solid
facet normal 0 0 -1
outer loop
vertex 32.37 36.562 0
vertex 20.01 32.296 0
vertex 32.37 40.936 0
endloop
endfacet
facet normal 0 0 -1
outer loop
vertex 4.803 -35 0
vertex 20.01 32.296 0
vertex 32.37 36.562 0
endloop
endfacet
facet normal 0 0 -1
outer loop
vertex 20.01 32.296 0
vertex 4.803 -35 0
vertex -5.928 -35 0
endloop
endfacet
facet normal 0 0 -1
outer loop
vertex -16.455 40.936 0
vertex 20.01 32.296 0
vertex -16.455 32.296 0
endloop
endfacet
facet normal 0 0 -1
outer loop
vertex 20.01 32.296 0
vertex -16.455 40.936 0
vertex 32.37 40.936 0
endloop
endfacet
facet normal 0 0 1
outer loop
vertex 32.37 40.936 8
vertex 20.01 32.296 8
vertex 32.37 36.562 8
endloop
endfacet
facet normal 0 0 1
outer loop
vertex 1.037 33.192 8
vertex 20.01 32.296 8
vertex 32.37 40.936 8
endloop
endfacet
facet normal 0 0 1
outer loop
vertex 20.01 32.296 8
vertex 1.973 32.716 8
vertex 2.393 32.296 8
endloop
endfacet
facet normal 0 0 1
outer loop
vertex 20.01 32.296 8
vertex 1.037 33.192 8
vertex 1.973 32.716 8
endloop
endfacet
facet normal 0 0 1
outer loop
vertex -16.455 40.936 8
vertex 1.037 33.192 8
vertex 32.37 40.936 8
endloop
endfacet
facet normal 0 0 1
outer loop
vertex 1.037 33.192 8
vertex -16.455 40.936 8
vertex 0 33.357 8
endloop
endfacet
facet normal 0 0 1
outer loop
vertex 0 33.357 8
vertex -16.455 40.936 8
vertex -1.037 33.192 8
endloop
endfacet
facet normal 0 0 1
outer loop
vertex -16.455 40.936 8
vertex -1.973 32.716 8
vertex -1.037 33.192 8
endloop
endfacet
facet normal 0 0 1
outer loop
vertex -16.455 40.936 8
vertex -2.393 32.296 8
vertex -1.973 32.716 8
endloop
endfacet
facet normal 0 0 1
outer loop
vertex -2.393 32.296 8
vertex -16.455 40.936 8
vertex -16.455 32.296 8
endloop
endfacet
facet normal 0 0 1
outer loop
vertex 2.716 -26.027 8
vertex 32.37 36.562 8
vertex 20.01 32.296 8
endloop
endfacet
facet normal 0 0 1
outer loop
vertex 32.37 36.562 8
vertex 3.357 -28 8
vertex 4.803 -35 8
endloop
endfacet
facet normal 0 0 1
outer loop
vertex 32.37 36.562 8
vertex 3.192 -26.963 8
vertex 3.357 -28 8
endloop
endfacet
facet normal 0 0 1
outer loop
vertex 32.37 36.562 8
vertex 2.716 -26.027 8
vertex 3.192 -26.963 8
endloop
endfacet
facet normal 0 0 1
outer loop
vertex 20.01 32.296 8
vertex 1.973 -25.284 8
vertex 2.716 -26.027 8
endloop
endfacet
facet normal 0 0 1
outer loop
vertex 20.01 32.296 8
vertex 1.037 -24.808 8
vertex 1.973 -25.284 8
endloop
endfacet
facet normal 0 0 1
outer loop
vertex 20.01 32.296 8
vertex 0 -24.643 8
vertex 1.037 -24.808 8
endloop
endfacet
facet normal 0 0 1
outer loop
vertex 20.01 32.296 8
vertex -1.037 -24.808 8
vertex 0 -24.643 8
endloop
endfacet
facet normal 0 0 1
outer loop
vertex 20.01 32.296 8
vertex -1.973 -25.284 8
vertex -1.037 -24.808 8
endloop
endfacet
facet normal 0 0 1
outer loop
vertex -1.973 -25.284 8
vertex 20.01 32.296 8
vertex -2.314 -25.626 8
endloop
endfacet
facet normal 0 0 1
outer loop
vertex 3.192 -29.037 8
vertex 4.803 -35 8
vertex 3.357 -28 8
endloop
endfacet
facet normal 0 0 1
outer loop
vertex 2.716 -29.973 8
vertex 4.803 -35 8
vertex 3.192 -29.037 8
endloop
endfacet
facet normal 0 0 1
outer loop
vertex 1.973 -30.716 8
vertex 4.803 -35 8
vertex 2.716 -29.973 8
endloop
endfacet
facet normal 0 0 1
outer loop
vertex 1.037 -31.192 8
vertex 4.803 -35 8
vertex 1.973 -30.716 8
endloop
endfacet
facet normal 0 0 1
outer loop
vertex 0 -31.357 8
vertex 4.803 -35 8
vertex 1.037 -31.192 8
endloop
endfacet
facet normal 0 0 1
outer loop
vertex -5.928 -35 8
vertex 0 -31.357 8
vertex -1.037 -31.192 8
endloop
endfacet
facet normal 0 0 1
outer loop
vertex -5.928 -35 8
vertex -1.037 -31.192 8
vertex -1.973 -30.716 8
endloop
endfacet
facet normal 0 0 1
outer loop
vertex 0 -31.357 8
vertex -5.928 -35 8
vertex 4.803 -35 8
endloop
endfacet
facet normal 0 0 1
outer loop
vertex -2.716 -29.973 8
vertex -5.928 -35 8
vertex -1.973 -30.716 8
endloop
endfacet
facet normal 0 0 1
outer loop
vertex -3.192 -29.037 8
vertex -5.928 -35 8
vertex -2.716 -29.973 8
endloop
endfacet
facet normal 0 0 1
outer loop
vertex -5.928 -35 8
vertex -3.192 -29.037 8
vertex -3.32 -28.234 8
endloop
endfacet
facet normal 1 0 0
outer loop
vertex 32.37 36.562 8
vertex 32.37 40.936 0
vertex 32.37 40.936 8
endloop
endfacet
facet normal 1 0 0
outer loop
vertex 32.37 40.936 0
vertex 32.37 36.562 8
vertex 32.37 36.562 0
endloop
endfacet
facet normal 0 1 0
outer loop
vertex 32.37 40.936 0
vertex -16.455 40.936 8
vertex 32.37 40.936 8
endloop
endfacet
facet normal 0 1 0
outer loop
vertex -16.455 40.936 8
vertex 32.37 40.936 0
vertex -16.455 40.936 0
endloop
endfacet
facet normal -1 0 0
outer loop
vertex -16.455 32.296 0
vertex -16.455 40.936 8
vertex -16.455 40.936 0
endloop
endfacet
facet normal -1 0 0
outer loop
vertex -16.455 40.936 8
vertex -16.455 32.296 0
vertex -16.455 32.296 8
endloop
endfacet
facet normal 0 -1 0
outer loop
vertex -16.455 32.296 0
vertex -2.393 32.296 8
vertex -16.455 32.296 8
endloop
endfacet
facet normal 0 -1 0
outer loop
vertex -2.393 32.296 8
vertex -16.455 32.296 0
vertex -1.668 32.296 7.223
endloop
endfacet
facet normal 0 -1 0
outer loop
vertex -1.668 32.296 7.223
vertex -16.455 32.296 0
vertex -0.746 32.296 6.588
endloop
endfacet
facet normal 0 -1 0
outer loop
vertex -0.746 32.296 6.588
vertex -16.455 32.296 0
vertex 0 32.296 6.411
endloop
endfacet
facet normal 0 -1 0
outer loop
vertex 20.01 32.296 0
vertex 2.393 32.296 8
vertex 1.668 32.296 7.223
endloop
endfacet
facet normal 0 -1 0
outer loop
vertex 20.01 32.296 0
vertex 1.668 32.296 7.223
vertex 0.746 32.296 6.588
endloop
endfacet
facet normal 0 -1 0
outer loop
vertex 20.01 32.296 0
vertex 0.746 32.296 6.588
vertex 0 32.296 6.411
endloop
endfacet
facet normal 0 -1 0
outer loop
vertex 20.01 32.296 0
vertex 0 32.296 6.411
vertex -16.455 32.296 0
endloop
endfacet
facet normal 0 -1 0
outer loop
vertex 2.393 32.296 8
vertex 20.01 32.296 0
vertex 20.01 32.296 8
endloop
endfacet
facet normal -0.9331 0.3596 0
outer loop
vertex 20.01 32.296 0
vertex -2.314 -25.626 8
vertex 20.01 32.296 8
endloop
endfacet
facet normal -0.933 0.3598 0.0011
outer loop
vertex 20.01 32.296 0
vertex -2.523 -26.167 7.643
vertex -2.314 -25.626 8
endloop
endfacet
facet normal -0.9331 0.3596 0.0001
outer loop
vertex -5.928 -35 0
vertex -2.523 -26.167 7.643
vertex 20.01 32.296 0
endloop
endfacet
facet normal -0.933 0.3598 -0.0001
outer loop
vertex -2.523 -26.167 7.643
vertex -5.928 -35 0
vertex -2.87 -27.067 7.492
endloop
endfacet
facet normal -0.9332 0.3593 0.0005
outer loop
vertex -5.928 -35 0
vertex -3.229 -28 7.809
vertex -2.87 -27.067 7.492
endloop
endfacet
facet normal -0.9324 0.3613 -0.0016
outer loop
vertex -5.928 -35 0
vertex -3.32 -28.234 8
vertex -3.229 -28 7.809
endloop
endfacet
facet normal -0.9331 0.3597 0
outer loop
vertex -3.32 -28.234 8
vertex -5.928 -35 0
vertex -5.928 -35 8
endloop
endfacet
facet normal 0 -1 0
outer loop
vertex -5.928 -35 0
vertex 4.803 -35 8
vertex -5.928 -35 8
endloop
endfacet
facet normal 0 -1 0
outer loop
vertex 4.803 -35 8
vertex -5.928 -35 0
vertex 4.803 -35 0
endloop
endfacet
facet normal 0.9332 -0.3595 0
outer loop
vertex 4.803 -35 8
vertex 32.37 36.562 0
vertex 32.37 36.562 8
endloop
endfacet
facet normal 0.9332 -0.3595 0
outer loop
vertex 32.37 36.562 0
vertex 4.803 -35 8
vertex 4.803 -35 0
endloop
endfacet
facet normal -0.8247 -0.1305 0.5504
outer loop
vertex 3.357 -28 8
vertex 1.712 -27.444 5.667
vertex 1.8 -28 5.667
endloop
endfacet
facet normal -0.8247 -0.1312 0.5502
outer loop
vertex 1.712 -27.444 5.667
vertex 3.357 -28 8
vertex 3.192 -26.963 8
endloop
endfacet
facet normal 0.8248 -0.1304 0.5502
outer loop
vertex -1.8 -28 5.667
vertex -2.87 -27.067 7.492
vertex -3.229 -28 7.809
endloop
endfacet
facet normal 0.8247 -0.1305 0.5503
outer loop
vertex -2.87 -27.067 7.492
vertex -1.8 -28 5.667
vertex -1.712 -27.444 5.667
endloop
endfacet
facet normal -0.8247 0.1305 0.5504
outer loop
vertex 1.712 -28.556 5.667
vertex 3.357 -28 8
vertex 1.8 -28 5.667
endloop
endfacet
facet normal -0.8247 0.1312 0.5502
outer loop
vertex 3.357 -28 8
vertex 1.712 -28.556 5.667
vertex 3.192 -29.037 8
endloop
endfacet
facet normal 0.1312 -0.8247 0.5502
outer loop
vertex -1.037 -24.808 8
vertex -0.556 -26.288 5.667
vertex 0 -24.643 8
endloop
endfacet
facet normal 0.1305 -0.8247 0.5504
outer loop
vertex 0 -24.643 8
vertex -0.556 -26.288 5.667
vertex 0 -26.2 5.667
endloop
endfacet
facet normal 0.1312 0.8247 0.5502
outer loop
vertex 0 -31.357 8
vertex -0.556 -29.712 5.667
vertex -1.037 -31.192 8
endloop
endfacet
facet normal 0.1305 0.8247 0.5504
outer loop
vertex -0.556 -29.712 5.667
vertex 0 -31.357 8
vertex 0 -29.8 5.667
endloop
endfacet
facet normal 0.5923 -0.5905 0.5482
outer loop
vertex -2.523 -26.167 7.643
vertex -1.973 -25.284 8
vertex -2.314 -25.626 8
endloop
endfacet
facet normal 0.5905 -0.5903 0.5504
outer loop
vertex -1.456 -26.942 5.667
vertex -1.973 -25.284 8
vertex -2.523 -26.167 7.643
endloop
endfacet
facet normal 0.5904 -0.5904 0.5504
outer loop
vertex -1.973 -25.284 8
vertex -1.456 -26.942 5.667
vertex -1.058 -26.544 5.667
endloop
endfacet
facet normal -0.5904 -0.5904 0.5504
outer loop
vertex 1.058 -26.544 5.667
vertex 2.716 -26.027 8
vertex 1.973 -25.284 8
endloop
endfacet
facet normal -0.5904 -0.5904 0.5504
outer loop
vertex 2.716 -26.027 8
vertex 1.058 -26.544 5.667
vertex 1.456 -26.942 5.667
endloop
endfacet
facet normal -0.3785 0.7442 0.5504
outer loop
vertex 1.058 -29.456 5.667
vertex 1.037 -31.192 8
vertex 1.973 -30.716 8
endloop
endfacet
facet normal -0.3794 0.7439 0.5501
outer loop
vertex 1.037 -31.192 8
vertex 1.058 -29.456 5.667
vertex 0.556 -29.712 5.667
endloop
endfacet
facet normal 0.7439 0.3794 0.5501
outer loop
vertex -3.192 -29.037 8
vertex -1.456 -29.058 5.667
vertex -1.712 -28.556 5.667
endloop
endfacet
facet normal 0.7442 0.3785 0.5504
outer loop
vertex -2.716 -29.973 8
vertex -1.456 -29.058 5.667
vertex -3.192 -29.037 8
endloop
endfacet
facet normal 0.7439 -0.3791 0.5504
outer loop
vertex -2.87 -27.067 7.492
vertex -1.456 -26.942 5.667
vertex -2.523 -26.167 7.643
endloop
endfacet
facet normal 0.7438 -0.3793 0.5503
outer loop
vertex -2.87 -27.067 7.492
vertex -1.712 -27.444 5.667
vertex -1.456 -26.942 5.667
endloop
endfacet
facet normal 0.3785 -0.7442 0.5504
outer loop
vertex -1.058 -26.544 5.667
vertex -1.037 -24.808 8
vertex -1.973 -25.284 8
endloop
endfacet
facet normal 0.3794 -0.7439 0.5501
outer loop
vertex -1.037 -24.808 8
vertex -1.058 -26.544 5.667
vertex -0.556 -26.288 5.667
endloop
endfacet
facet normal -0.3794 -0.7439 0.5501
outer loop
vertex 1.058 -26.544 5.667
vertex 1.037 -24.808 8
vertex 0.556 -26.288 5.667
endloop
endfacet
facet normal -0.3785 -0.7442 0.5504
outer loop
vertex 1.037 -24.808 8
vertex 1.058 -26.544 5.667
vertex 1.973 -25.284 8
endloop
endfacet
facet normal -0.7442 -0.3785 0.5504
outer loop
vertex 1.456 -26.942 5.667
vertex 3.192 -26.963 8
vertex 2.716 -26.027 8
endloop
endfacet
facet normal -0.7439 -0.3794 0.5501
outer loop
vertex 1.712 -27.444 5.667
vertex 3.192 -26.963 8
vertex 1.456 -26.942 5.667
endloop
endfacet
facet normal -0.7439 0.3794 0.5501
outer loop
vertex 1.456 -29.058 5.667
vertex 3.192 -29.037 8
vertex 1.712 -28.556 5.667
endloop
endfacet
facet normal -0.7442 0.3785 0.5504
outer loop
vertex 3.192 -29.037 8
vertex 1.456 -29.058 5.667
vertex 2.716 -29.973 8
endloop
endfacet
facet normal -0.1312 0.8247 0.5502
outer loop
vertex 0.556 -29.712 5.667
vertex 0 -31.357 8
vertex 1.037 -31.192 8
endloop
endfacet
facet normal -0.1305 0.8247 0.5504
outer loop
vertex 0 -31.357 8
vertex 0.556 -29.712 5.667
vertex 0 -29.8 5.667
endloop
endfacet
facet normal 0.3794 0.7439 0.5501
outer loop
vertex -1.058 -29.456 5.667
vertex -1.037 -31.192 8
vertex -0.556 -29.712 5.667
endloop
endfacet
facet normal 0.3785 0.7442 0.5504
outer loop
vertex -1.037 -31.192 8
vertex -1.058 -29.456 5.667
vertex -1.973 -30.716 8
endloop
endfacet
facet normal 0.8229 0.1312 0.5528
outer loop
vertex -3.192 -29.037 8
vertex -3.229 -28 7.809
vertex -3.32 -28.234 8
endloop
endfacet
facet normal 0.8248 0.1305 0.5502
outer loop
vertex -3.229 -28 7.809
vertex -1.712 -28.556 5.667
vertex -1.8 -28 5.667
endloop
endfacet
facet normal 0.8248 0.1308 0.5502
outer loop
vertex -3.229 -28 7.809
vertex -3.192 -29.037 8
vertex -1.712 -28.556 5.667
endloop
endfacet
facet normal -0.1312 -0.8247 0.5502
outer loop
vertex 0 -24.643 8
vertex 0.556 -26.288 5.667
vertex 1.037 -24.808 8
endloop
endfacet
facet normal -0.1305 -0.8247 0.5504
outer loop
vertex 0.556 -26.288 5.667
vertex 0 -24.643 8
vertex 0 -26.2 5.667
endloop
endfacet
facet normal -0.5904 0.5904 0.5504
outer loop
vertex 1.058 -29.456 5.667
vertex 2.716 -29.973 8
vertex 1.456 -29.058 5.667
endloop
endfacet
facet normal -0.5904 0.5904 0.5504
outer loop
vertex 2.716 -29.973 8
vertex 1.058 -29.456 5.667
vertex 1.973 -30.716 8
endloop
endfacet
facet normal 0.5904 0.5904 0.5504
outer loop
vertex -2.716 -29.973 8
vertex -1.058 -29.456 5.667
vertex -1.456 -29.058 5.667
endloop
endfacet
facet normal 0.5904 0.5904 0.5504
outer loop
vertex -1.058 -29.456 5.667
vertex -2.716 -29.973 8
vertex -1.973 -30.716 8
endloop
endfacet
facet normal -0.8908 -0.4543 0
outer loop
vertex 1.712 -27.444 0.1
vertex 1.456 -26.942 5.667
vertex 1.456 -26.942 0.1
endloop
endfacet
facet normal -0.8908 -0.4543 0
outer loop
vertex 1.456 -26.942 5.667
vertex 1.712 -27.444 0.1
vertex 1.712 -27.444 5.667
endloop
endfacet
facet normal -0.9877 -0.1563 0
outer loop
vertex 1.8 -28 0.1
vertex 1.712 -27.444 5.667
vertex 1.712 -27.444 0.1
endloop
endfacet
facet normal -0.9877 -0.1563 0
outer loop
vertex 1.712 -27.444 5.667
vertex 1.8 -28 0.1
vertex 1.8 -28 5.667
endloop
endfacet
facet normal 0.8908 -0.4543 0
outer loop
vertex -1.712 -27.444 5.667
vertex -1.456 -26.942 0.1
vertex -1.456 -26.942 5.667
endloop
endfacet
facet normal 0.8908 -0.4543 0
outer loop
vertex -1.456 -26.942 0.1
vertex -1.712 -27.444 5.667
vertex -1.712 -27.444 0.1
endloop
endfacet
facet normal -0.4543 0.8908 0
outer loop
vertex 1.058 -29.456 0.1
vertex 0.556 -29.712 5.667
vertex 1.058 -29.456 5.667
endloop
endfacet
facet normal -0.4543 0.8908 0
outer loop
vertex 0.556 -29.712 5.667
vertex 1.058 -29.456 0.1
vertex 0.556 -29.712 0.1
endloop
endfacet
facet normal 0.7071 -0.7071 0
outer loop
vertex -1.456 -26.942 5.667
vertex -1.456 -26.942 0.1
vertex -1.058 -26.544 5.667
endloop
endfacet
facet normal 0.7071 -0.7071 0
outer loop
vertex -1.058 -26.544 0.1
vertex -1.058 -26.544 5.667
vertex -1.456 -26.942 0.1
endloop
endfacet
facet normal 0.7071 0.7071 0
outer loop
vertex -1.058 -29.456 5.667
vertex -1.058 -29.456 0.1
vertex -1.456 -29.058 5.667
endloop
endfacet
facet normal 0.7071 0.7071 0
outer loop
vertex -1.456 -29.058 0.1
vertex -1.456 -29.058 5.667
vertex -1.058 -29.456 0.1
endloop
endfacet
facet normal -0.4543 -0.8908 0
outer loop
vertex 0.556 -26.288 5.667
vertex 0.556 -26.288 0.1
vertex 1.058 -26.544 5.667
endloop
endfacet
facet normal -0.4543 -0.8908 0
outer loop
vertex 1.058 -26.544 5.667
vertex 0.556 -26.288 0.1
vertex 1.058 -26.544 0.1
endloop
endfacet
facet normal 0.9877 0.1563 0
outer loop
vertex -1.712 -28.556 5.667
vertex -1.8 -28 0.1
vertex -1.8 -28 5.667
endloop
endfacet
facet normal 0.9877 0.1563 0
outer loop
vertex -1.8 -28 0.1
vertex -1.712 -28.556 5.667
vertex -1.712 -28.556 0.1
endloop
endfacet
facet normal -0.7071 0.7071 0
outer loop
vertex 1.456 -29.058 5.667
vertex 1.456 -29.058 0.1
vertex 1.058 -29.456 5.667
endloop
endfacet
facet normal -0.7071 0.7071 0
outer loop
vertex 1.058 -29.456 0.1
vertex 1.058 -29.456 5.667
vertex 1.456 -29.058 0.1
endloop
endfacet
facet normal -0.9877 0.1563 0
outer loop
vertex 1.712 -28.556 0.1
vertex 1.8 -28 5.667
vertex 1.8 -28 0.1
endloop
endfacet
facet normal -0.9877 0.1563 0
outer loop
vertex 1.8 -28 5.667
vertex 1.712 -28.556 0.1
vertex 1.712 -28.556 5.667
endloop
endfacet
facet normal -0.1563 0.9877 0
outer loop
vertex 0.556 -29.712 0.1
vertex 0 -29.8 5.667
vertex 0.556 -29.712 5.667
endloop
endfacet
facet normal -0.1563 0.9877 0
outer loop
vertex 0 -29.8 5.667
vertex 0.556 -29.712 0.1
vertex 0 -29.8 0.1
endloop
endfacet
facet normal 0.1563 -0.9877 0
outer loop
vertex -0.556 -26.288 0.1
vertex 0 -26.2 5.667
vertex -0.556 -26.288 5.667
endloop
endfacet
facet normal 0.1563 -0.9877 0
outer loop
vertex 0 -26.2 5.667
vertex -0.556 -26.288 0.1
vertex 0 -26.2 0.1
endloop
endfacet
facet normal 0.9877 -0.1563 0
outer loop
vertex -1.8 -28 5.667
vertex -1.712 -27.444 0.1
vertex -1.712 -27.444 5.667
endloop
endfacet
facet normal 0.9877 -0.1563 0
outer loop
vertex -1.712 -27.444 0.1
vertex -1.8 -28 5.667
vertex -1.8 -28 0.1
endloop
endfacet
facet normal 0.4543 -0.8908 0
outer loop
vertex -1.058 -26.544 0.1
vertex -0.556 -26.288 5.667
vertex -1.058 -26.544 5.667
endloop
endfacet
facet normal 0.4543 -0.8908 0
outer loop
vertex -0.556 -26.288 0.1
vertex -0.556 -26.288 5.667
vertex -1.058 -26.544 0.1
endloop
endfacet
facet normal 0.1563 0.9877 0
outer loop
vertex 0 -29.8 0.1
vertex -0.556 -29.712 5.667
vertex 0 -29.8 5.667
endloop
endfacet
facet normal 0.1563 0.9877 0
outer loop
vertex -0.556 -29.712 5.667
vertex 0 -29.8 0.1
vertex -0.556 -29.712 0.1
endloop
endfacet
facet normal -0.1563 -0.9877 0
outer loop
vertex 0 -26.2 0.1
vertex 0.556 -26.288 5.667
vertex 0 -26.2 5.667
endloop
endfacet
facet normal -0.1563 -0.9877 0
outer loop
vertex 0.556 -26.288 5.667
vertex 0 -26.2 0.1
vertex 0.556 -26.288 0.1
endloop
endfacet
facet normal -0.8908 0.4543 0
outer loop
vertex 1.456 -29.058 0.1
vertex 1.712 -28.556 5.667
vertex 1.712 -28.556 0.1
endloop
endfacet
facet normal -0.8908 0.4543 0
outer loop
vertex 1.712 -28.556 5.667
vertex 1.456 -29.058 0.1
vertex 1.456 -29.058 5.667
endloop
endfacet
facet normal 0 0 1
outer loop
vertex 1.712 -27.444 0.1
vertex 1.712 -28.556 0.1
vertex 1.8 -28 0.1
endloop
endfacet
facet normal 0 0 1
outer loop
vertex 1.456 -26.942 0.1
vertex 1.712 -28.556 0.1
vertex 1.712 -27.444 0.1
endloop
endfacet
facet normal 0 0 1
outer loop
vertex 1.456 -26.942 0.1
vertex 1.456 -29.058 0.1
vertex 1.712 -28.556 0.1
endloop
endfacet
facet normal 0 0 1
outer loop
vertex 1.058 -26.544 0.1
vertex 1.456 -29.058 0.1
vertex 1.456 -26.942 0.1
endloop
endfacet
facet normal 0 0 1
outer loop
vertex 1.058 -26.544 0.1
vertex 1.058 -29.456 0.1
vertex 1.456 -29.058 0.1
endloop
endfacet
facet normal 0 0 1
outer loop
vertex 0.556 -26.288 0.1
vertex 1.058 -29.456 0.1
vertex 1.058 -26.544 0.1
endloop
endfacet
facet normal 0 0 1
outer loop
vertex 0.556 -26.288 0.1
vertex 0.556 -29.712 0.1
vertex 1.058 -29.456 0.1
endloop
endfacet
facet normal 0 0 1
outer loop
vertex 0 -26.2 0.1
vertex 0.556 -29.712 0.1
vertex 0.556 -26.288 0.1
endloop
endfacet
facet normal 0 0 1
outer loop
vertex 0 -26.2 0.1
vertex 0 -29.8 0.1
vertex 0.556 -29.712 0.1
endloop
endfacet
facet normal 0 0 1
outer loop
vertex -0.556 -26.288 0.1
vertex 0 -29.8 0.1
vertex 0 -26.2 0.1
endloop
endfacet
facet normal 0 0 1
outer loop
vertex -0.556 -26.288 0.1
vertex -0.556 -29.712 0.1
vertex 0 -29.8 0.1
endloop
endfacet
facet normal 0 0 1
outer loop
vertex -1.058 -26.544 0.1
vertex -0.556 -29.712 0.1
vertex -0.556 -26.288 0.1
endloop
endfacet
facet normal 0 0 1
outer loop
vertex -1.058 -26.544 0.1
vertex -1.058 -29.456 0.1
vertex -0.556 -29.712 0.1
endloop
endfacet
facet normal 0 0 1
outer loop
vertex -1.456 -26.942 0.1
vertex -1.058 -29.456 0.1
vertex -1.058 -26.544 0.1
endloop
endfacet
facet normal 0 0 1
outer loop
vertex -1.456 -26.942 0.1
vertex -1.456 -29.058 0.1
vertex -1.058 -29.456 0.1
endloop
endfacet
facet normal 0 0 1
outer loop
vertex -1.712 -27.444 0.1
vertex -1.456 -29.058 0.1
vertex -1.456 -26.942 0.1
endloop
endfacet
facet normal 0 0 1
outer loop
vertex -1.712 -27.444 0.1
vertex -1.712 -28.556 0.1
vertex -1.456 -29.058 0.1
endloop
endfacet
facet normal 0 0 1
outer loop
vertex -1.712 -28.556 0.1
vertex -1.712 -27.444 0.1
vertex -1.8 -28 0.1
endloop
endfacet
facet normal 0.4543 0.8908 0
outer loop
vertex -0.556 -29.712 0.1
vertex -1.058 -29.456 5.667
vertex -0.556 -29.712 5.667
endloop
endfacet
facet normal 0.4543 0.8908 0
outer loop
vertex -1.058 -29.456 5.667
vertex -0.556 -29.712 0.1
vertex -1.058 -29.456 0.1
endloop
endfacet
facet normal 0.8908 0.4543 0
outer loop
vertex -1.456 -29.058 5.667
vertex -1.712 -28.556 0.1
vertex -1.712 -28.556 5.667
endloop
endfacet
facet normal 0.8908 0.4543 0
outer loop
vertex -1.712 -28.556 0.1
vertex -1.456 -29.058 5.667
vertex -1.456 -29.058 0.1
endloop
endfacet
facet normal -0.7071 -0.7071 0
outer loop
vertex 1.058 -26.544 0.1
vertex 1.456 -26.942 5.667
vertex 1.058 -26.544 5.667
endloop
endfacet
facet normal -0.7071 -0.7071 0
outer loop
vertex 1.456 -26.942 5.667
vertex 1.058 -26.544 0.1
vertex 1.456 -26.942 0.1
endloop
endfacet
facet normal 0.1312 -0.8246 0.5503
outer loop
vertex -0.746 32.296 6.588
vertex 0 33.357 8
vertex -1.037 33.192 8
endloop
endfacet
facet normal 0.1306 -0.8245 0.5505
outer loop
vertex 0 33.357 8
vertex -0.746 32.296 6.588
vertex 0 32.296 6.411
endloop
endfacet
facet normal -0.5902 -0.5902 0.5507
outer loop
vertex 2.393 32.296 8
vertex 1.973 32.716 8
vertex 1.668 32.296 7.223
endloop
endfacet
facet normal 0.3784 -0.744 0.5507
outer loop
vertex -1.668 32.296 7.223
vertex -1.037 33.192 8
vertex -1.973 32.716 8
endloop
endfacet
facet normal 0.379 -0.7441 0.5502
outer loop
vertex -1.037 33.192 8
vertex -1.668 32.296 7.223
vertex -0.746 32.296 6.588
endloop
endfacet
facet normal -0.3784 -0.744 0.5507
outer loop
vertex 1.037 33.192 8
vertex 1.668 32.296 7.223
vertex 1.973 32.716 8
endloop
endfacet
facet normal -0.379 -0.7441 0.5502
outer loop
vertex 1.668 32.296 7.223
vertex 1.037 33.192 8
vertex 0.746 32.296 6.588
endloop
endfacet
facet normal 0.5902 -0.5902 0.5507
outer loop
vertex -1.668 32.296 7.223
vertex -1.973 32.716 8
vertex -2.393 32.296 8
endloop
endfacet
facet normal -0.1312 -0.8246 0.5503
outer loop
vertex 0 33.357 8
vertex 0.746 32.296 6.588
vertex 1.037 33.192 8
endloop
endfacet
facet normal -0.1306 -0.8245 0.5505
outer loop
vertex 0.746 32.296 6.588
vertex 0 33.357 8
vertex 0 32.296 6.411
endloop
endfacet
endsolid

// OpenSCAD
// Street Numbers for 3D printing
// Charles Tilford, 2019
// License: CC BY-NC-SA 4.0
//   https://creativecommons.org/licenses/by-nc-sa/4.0/

char="7";     // The number/letter to print

// Units are in mm, except for height of letter

// How many inches high should letter be?
inchesHigh=3;
// How thick/deep should letter be (mm)?
depth=8;

// Character coordinates just center the letter
charX=-25;    // Character X coord
charY=-35;    // Character Y coord
topScrew=30;  // Top screw Y coord
botScrew=-28; // Bottom screw Y coord
height=8;     // Thickness of character
// Screw dimensions. Default presumes
// #6 sheet metal screw
screwWid=3.6; // Width of screw shaft
screwTop=6.78;// Width of screw head
screwCon=5.08;// Height of head 'cone'

// Font to print in. Your system needs this
// installed, of course. If changed the hole
// positions almost certainly need to be
// changed, and maybe charX/charY.
fName="Open Sans Extrabold";
// https://fonts.google.com/specimen/Open+Sans
// Designer: Steve Matteson

// Thin floor below holes. My printer was
// struggling to have the hole 'border' stick
// to the stage. Just drill/screw thru it.
holeFloor=0.1; 

// ==========================================
// ===== All values below are auto-calculated
// ==========================================

// Scaled values
scaleFactor=inchesHigh / 3;
cX=charX * scaleFactor;
cY=charY * scaleFactor;
tS=topScrew * scaleFactor;
bS=botScrew * scaleFactor;
// Where do we start drawing screw head cone?
oS=depth - (screwCon-.05);

difference() {
  // We use difference() to punch out the screw holes
  // in the character
    
  // The character itself, 8mm thick
  translate([cX,cY,0])
    linear_extrude(height=depth, scale=1)
    text(char, size=(75*scaleFactor),
         $fn=100, font=fName);
    
  // Bottom screw hole
  translate([0,bS,oS]) color("red")
    cylinder(h=screwCon, d2=screwTop,
             d1=0, $fn=20);
   translate([0,bS,holeFloor])
    cylinder(h=20, d=screwWid, $fn=20);
    
  // Top screw hole
  translate([0,tS,oS]) color("red")
    cylinder(h=screwCon, d2=screwTop,
             d1=0, $fn=20);
  translate([0,tS,holeFloor])
    cylinder(h=20, d=screwWid, $fn=20);
}

// Colors are just to aid visualization of
// void spaces. $fn is "featuer number", ie how
// many polygons are devoted to object. The values
// above should be near your printing limit anyway.

// Developed in OpenSCAD
//    https://www.openscad.org/
